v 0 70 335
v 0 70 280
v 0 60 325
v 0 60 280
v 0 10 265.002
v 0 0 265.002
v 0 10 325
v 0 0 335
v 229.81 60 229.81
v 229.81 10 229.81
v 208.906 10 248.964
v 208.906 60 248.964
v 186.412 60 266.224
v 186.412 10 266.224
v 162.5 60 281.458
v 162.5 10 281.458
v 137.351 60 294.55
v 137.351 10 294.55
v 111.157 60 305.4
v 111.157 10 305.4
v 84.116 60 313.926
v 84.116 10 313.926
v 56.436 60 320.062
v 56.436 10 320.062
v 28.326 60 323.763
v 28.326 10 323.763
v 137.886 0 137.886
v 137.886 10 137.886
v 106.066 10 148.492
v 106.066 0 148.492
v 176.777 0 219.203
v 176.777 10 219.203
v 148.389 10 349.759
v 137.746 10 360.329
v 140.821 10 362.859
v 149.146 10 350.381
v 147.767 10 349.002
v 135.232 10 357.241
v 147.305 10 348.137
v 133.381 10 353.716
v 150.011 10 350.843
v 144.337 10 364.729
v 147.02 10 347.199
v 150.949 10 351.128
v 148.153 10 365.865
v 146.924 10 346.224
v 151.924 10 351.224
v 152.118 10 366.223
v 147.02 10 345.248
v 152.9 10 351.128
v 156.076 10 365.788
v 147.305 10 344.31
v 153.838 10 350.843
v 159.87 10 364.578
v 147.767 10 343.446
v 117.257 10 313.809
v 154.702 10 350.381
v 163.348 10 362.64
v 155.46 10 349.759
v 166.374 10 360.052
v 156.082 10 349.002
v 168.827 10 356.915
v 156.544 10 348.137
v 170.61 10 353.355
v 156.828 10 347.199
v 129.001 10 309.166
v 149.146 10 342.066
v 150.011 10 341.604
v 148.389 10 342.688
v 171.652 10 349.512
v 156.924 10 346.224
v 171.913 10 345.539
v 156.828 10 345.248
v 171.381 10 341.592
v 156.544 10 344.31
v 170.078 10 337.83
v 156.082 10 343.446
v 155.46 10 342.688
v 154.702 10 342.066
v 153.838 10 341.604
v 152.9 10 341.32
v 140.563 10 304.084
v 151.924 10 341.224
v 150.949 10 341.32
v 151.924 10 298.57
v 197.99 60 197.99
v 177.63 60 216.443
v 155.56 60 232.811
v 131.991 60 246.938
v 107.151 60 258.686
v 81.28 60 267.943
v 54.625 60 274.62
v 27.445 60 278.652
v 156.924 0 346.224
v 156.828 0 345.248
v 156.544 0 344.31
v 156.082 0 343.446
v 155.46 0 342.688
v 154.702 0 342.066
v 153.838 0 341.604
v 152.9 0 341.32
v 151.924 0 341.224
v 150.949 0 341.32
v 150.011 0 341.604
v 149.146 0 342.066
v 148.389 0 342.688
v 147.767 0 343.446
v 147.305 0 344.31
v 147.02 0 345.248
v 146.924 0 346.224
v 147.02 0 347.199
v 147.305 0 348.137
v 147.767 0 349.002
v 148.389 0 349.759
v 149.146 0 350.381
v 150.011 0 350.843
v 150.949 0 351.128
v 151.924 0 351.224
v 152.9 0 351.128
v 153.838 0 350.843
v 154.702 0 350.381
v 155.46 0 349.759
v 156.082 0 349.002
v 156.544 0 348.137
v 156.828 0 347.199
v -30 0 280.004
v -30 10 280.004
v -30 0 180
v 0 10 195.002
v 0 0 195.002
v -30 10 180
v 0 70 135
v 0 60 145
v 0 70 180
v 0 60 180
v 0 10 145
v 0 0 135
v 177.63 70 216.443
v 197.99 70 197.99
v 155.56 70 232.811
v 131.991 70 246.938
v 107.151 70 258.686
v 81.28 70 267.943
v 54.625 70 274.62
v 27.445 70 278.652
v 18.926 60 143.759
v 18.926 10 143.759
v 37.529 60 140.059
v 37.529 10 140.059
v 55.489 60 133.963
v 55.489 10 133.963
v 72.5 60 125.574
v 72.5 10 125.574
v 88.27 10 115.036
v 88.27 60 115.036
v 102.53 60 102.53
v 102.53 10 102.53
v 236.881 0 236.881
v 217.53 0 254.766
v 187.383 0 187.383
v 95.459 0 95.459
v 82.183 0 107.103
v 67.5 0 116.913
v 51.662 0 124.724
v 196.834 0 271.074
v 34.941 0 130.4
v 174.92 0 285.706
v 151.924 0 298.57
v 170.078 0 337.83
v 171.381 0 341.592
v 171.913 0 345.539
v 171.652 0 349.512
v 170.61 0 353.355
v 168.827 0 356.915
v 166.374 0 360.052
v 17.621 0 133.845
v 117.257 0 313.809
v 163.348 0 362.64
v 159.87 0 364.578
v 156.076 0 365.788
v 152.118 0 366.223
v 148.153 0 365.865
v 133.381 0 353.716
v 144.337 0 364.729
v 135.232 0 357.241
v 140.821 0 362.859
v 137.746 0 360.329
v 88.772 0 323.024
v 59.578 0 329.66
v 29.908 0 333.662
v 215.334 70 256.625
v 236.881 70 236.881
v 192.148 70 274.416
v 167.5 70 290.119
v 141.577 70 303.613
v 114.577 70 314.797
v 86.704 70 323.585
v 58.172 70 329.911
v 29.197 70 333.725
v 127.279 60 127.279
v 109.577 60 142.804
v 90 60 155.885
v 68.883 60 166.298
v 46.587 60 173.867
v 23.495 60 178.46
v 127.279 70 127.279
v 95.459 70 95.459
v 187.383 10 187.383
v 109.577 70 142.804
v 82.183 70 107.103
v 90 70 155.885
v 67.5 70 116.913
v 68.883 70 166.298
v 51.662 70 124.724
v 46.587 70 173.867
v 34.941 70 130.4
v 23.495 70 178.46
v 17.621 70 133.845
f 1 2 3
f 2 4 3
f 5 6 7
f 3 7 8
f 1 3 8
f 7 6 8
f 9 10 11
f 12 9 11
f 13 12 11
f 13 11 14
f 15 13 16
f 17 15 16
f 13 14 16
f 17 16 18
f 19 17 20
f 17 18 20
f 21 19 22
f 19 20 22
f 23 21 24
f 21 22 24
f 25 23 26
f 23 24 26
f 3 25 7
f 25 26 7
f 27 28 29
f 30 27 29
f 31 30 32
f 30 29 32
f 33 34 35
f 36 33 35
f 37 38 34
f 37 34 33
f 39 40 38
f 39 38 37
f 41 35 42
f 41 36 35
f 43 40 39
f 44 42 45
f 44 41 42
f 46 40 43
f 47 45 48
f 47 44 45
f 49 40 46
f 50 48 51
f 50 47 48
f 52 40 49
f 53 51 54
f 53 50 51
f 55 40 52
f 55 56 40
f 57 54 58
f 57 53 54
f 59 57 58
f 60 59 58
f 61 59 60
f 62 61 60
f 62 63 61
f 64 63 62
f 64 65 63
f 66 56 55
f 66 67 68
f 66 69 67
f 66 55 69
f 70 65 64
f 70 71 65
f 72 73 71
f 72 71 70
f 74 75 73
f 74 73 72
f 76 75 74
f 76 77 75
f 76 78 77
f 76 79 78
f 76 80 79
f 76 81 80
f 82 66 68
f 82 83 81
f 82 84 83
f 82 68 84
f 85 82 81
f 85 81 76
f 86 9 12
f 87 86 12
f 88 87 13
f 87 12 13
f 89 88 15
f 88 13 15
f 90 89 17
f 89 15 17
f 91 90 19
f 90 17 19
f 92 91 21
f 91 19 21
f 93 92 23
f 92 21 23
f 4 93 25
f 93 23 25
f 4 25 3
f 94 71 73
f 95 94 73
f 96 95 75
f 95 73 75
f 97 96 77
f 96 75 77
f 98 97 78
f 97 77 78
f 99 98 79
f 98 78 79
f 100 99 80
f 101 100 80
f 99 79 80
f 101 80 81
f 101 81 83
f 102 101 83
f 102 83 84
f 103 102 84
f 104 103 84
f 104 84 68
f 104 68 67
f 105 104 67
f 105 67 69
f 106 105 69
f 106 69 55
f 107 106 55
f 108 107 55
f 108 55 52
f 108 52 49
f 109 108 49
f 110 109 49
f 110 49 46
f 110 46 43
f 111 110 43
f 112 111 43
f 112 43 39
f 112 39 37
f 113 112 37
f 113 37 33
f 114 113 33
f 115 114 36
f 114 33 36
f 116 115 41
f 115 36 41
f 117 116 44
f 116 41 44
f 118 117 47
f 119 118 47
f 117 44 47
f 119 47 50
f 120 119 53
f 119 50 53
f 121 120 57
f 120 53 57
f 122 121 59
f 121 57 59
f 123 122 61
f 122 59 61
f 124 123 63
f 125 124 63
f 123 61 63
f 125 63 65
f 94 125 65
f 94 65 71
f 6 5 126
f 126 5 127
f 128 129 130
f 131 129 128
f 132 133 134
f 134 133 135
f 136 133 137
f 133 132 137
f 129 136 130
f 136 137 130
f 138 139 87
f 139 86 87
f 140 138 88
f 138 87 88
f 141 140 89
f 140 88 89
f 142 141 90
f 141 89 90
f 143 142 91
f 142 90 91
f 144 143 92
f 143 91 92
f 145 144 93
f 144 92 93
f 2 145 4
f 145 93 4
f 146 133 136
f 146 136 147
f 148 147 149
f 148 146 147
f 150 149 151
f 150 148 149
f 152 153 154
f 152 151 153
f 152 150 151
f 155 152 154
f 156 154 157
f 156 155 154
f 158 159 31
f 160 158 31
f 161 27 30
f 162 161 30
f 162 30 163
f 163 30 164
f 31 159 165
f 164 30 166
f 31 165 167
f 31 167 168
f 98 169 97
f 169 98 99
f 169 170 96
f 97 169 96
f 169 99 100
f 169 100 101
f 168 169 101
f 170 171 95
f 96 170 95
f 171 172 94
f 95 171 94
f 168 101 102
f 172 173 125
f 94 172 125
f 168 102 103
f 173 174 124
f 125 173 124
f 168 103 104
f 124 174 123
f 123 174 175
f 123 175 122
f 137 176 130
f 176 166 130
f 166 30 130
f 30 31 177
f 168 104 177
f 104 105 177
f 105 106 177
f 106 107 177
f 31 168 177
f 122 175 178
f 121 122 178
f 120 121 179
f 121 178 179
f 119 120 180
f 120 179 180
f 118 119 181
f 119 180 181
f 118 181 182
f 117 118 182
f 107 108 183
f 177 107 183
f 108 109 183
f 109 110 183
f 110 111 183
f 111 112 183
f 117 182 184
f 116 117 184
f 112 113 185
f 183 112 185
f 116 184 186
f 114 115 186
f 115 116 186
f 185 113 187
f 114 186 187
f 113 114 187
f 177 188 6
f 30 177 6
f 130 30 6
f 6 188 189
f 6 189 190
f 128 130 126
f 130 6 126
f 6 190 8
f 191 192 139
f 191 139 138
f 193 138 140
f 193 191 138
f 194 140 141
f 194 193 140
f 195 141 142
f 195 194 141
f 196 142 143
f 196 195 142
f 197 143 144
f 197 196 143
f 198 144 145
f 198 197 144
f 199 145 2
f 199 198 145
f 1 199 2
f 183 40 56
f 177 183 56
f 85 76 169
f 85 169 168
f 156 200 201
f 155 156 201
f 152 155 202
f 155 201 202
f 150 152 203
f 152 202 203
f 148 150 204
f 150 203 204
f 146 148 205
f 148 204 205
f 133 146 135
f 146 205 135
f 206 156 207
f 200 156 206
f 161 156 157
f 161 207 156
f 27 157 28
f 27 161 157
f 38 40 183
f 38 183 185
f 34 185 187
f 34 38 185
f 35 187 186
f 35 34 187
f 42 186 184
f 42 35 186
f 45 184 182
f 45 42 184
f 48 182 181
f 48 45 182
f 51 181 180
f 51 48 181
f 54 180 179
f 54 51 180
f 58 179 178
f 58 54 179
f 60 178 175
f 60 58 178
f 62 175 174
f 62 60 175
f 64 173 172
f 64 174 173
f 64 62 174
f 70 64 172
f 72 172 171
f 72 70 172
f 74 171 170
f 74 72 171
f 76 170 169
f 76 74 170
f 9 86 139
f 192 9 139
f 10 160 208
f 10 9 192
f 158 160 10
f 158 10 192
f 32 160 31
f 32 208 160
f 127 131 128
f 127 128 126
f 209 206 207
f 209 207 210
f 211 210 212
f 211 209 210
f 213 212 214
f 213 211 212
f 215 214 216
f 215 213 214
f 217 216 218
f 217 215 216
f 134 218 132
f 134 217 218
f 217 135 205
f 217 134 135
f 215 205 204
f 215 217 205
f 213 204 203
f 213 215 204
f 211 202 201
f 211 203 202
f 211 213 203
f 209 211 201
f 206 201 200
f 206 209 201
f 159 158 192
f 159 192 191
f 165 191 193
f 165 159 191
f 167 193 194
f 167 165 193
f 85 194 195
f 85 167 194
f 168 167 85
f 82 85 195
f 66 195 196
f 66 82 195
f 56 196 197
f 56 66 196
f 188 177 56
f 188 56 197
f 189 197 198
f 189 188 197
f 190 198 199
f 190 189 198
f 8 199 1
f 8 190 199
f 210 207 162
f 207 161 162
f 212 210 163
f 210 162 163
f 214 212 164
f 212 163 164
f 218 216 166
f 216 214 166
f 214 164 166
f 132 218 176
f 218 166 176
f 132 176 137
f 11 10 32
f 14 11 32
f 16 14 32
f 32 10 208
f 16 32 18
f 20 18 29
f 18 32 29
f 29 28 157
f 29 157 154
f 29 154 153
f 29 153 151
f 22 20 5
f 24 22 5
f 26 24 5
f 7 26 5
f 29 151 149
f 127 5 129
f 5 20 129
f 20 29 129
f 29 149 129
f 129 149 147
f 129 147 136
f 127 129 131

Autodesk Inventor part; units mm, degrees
ref_plane "YZ Plane" through (0, 0, 0) normal (1, 0, 0) x (0, 1, 0)
ref_plane "XZ Plane" through (0, 0, 0) normal (0, 1, 0) x (-1, 0, 0)
ref_plane "XY Plane" through (0, 0, 0) normal (0, 0, 1) x (1, 0, 0)
sketch "Sketch1" plane through (0, 0, 0) normal (0, 1, 0) x (-1, 0, 0)
  circle A0 centre (0, 0) radius 335
  line L0 (335, 0) -> (-335, 0)
  line L1 (0, -335) -> (0, 335)
  line L2 (0, 0) -> (-236.8808, 236.8808)
  line L3 (0, 0) -> (236.8808, -236.8808)
  line L4 (0, 0) -> (236.8808, 236.8808)
  line L5 (0, 0) -> (-236.8808, -236.8808)
  circle A1 centre (0, 0) radius 135
  point P0 (-95.4594, 95.4594)
  point P1 (0, 135)
  dimension "d0" = 670
  dimension "d1" = 45
  dimension "d2" = 45
  dimension "d17" = 200
extrude "Extrusion1" add sketch "Sketch1" along normal blind 70 contours L1 A1 L2 A0
sketch "Sketch2" plane through (95.4594, 0, 95.4594) normal (0.7071068, 0, -0.7071068) x (-0.7071068, 0, -0.7071068)
  line L0 (-190, 60) -> (-10, 60)
  line L1 (-10, 60) -> (-10, 10)
  line L2 (-10, 10) -> (-190, 10)
  line L3 (-190, 10) -> (-190, 60)
  line L4 (-200, 0) -> (0, 0) projected
  line L5 (-200, 70) -> (0, 70) projected
  line L6 (-200, 0) -> (-200, 70) projected
  line L7 (0, 0) -> (0, 70) projected
  point P0 (135, 0)
  point P1 (0, 35)
  dimension "d6" = 10
  dimension "d7" = 10
  dimension "d8" = 10
  dimension "d9" = 10
sketch3d "3D Sketch1"
  arc A0 (95.4594, 70, 95.4594) -> (0, 70, 135) centre (0, 70, 0) ccw
sweep "Sweep1" cut profiles "Sketch2" path "3D Sketch1" contours L0 L1 L2 L3
sketch "Sketch3" plane through (95.4594, 0, 95.4594) normal (0.7071068, 0, -0.7071068) x (-0.7071068, 0, -0.7071068)
  line L0 (-101.8808, 70) -> (-200, 70) projected
  line L1 (32.4695, 60) -> (-94.8097, 60) projected
  line L2 (-145, 70) -> (-45, 70)
  line L3 (-45, 70) -> (-45, 60)
  line L4 (-45, 60) -> (-145, 60)
  line L5 (-145, 60) -> (-145, 70)
  line L6 (-200, 0) -> (-200, 70) projected
  line L7 (0, 0) -> (0, 70) projected
  point P0 (135, 0)
  dimension "d16" = 100
  dimension "d18" = 45
sketch3d "3D Sketch2"
  arc A0 (95.4594, 70, 95.4594) -> (0, 70, 135) centre (0, 70, 0) ccw
sweep "Sweep2" cut profiles "Sketch3" path "3D Sketch2"
sketch "Sketch5" plane through (0, 10, 325) normal (0, 1, 0) x (1, 0, 0)
  line L0 (0, 0) -> (0, 180) projected
  arc A0 (0, 145) -> (127.2792, 197.7208) centre (0, 325) ccw projected
  line L1 (127.2792, 197.7208) -> (95.4594, 229.5406) projected
  arc A1 (0, 190) -> (95.4594, 229.5406) centre (0, 325) ccw projected
  line L2 (0, 190) -> (0, 145) projected
  arc A2 (0, 45) -> (197.9899, 127.0101) centre (0, 325) ccw projected
  line L3 (0, 45) -> (0, -10) projected
  arc A3 (0, -10) -> (236.8808, 88.1192) centre (0, 325) ccw projected
  line L4 (236.8808, 88.1192) -> (197.9899, 127.0101) projected
  line L5 (0, 145) -> (-30, 145)
  line L6 (-30, 145) -> (-30, 44.996)
  line L7 (-30, 44.996) -> (0, 44.996)
  line L8 (0, 44.996) -> (0, 145)
  line L9 (0, 190) -> (0, -10) projected
  line L10 (0, 129.998) -> (-30, 129.998)
  line L11 (-30, 129.998) -> (-30, 59.998)
  line L12 (-30, 59.998) -> (0, 59.998)
  line L13 (0, 59.998) -> (0, 129.998)
  line L14 (0, 44.996) -> (-30, 145) construction
  line L15 (0, 145) -> (-30, 44.996) construction
  line L16 (0, 59.998) -> (-30, 129.998) construction
  line L17 (-30, 59.998) -> (0, 129.998) construction
  line L18 (-15, 94.998) -> (-30, 94.998) construction
  line L19 (-15, 94.998) -> (-30, 94.998) construction
  line L20 (0, 59.998) -> (-30, 44.996)
  line L21 (0, 129.998) -> (-30, 145)
  point P0 (0, 44.996)
  point P1 (0, 59.998)
  dimension "d21" = 30
  dimension "d27" = 70
extrude "Extrusion2" add sketch "Sketch5" against normal blind 10 contours L6 L12 L20 | L12 L6 L10 L0 | L10 L6 L21
sketch "Sketch6" plane through (-30, 10, 280.004) normal (0, 1, 0) x (1, 0, 0)
  line L0 (132.5305, 177.4736) -> (259.8097, 50.1943) projected
  arc A0 (30, 135.004) -> (132.5305, 177.4736) centre (30, 280.004) ccw projected
  line L1 (30, 85.002) -> (30, 135.004) projected
  line L2 (0, 100.004) -> (0, 0) projected
  line L3 (30, -44.996) -> (30, 15.002) projected
  arc A1 (30, -44.996) -> (259.8097, 50.1943) centre (30, 280.004) ccw projected
  arc A2 (30, 100.004) -> (157.2792, 152.7248) centre (30, 280.004) ccw projected
  line L4 (157.2792, 152.7248) -> (136.066, 131.5116)
  line L5 (136.066, 131.5116) -> (206.7767, 60.8009)
  line L6 (206.7767, 60.8009) -> (227.9899, 82.0141)
  line L7 (227.9899, 82.0141) -> (157.2792, 152.7248)
  arc A3 (30, 100.004) -> (157.2792, 152.7248) centre (30, 280.004) ccw projected
  arc A4 (30, 0.004) -> (227.9899, 82.0141) centre (30, 280.004) ccw projected
  line L8 (30, 0.004) -> (30, -54.996) projected
  arc A5 (30, -54.996) -> (266.8808, 43.1233) centre (30, 280.004) ccw projected
  line L9 (266.8808, 43.1233) -> (227.9899, 82.0141) projected
  arc A6 (30, 100.004) -> (157.2792, 152.7248) centre (30, 280.004) ccw projected
  line L10 (157.2792, 152.7248) -> (125.4594, 184.5446) projected
  arc A7 (30, 145.004) -> (125.4594, 184.5446) centre (30, 280.004) ccw projected
  line L11 (30, 145.004) -> (30, 100.004) projected
  line L12 (167.8858, 142.1182) -> (146.6726, 120.905)
  line L13 (146.6726, 120.905) -> (196.1701, 71.4075)
  line L14 (196.1701, 71.4075) -> (217.3833, 92.6207)
  line L15 (217.3833, 92.6207) -> (167.8858, 142.1182)
  line L16 (167.8858, 142.1182) -> (196.1701, 71.4075) construction
  line L17 (217.3833, 92.6207) -> (146.6726, 120.905) construction
  line L18 (157.2792, 152.7248) -> (206.7767, 60.8009) construction
  line L19 (227.9899, 82.0141) -> (136.066, 131.5116) construction
  line L20 (182.028, 106.7629) -> (171.4214, 96.1563) construction
  line L21 (182.028, 106.7629) -> (171.4214, 96.1563) construction
  line L22 (217.3833, 92.6207) -> (206.7767, 60.8009)
  line L23 (167.8858, 142.1182) -> (136.066, 131.5116)
  line L24 (30, 85.002) -> (0, 100.004) projected
  line L25 (0, 0) -> (30, 15.002) projected
  point P0 (207.7219, 63.6364)
  point P1 (217.3833, 92.6207)
  point P2 (167.8858, 142.1182)
  point P3 (205.637, 61.9406)
  dimension "d23" = 30
  dimension "d24" = 70
extrude "Extrusion3" cut sketch "Sketch6" against normal blind 10 contours L0 L14 L5 L12 | L12 L5 L23 | L22 A4 L5 L14 | L22 L5 A4
sketch "Sketch7" plane through (-30, 10, 280.004) normal (0, 1, 0) x (1, 0, 0)
  arc A0 (30, -44.996) -> (259.8097, 50.1943) centre (30, 280.004) ccw projected
  arc A1 (30, 0.004) -> (227.9899, 82.0141) centre (30, 280.004) ccw projected
  line L0 (30, 0.004) -> (30, -54.996) projected
  arc A2 (30, -54.996) -> (266.8808, 43.1233) centre (30, 280.004) ccw projected
  line L1 (266.8808, 43.1233) -> (227.9899, 82.0141) projected
  arc A3 (30, -54.996) -> (266.8808, 43.1233) centre (30, 280.004) ccw construction
  line L2 (30, 0.004) -> (266.8808, 43.1233) construction
  line L3 (266.8808, 43.1233) -> (227.9899, 82.0141) construction
  line L4 (266.8808, 43.1233) -> (217.3833, 92.6207) construction
  line L5 (227.9899, 82.0141) -> (227.9899, 82.0141) construction
  line L6 (217.3833, 92.6207) -> (259.8097, 50.1943) construction
  line L7 (227.9899, 82.0141) -> (227.9899, 82.0141) construction
  line L8 (227.9899, 82.0141) -> (227.9899, 82.0141) construction
  line L9 (227.9899, 82.0141) -> (227.9899, 82.0141) construction
  line L10 (227.9899, 82.0141) -> (39.9698, -54.8476) construction
  line L11 (143.7771, 20.7148) -> (196.6229, -99.7168) construction
  circle A4 centre (181.9243, -66.2198) radius 20
  line L12 (163.3808, -73.7121) -> (147.2566, -33.8047)
  line L13 (200.0777, -57.8259) -> (181.9244, -18.5659)
  circle A5 centre (181.9243, -66.2198) radius 5
  point P0 (181.9244, -18.5659)
  point P1 (147.2566, -33.8047)
  dimension "d28" = 40
  dimension "d31" = 10
extrude "Extrusion4" add sketch "Sketch7" against normal blind 10 contours A2 L13 A4 L12 | A4
properties part number "Carousel Fixed Track" material "PLA Plastic"
